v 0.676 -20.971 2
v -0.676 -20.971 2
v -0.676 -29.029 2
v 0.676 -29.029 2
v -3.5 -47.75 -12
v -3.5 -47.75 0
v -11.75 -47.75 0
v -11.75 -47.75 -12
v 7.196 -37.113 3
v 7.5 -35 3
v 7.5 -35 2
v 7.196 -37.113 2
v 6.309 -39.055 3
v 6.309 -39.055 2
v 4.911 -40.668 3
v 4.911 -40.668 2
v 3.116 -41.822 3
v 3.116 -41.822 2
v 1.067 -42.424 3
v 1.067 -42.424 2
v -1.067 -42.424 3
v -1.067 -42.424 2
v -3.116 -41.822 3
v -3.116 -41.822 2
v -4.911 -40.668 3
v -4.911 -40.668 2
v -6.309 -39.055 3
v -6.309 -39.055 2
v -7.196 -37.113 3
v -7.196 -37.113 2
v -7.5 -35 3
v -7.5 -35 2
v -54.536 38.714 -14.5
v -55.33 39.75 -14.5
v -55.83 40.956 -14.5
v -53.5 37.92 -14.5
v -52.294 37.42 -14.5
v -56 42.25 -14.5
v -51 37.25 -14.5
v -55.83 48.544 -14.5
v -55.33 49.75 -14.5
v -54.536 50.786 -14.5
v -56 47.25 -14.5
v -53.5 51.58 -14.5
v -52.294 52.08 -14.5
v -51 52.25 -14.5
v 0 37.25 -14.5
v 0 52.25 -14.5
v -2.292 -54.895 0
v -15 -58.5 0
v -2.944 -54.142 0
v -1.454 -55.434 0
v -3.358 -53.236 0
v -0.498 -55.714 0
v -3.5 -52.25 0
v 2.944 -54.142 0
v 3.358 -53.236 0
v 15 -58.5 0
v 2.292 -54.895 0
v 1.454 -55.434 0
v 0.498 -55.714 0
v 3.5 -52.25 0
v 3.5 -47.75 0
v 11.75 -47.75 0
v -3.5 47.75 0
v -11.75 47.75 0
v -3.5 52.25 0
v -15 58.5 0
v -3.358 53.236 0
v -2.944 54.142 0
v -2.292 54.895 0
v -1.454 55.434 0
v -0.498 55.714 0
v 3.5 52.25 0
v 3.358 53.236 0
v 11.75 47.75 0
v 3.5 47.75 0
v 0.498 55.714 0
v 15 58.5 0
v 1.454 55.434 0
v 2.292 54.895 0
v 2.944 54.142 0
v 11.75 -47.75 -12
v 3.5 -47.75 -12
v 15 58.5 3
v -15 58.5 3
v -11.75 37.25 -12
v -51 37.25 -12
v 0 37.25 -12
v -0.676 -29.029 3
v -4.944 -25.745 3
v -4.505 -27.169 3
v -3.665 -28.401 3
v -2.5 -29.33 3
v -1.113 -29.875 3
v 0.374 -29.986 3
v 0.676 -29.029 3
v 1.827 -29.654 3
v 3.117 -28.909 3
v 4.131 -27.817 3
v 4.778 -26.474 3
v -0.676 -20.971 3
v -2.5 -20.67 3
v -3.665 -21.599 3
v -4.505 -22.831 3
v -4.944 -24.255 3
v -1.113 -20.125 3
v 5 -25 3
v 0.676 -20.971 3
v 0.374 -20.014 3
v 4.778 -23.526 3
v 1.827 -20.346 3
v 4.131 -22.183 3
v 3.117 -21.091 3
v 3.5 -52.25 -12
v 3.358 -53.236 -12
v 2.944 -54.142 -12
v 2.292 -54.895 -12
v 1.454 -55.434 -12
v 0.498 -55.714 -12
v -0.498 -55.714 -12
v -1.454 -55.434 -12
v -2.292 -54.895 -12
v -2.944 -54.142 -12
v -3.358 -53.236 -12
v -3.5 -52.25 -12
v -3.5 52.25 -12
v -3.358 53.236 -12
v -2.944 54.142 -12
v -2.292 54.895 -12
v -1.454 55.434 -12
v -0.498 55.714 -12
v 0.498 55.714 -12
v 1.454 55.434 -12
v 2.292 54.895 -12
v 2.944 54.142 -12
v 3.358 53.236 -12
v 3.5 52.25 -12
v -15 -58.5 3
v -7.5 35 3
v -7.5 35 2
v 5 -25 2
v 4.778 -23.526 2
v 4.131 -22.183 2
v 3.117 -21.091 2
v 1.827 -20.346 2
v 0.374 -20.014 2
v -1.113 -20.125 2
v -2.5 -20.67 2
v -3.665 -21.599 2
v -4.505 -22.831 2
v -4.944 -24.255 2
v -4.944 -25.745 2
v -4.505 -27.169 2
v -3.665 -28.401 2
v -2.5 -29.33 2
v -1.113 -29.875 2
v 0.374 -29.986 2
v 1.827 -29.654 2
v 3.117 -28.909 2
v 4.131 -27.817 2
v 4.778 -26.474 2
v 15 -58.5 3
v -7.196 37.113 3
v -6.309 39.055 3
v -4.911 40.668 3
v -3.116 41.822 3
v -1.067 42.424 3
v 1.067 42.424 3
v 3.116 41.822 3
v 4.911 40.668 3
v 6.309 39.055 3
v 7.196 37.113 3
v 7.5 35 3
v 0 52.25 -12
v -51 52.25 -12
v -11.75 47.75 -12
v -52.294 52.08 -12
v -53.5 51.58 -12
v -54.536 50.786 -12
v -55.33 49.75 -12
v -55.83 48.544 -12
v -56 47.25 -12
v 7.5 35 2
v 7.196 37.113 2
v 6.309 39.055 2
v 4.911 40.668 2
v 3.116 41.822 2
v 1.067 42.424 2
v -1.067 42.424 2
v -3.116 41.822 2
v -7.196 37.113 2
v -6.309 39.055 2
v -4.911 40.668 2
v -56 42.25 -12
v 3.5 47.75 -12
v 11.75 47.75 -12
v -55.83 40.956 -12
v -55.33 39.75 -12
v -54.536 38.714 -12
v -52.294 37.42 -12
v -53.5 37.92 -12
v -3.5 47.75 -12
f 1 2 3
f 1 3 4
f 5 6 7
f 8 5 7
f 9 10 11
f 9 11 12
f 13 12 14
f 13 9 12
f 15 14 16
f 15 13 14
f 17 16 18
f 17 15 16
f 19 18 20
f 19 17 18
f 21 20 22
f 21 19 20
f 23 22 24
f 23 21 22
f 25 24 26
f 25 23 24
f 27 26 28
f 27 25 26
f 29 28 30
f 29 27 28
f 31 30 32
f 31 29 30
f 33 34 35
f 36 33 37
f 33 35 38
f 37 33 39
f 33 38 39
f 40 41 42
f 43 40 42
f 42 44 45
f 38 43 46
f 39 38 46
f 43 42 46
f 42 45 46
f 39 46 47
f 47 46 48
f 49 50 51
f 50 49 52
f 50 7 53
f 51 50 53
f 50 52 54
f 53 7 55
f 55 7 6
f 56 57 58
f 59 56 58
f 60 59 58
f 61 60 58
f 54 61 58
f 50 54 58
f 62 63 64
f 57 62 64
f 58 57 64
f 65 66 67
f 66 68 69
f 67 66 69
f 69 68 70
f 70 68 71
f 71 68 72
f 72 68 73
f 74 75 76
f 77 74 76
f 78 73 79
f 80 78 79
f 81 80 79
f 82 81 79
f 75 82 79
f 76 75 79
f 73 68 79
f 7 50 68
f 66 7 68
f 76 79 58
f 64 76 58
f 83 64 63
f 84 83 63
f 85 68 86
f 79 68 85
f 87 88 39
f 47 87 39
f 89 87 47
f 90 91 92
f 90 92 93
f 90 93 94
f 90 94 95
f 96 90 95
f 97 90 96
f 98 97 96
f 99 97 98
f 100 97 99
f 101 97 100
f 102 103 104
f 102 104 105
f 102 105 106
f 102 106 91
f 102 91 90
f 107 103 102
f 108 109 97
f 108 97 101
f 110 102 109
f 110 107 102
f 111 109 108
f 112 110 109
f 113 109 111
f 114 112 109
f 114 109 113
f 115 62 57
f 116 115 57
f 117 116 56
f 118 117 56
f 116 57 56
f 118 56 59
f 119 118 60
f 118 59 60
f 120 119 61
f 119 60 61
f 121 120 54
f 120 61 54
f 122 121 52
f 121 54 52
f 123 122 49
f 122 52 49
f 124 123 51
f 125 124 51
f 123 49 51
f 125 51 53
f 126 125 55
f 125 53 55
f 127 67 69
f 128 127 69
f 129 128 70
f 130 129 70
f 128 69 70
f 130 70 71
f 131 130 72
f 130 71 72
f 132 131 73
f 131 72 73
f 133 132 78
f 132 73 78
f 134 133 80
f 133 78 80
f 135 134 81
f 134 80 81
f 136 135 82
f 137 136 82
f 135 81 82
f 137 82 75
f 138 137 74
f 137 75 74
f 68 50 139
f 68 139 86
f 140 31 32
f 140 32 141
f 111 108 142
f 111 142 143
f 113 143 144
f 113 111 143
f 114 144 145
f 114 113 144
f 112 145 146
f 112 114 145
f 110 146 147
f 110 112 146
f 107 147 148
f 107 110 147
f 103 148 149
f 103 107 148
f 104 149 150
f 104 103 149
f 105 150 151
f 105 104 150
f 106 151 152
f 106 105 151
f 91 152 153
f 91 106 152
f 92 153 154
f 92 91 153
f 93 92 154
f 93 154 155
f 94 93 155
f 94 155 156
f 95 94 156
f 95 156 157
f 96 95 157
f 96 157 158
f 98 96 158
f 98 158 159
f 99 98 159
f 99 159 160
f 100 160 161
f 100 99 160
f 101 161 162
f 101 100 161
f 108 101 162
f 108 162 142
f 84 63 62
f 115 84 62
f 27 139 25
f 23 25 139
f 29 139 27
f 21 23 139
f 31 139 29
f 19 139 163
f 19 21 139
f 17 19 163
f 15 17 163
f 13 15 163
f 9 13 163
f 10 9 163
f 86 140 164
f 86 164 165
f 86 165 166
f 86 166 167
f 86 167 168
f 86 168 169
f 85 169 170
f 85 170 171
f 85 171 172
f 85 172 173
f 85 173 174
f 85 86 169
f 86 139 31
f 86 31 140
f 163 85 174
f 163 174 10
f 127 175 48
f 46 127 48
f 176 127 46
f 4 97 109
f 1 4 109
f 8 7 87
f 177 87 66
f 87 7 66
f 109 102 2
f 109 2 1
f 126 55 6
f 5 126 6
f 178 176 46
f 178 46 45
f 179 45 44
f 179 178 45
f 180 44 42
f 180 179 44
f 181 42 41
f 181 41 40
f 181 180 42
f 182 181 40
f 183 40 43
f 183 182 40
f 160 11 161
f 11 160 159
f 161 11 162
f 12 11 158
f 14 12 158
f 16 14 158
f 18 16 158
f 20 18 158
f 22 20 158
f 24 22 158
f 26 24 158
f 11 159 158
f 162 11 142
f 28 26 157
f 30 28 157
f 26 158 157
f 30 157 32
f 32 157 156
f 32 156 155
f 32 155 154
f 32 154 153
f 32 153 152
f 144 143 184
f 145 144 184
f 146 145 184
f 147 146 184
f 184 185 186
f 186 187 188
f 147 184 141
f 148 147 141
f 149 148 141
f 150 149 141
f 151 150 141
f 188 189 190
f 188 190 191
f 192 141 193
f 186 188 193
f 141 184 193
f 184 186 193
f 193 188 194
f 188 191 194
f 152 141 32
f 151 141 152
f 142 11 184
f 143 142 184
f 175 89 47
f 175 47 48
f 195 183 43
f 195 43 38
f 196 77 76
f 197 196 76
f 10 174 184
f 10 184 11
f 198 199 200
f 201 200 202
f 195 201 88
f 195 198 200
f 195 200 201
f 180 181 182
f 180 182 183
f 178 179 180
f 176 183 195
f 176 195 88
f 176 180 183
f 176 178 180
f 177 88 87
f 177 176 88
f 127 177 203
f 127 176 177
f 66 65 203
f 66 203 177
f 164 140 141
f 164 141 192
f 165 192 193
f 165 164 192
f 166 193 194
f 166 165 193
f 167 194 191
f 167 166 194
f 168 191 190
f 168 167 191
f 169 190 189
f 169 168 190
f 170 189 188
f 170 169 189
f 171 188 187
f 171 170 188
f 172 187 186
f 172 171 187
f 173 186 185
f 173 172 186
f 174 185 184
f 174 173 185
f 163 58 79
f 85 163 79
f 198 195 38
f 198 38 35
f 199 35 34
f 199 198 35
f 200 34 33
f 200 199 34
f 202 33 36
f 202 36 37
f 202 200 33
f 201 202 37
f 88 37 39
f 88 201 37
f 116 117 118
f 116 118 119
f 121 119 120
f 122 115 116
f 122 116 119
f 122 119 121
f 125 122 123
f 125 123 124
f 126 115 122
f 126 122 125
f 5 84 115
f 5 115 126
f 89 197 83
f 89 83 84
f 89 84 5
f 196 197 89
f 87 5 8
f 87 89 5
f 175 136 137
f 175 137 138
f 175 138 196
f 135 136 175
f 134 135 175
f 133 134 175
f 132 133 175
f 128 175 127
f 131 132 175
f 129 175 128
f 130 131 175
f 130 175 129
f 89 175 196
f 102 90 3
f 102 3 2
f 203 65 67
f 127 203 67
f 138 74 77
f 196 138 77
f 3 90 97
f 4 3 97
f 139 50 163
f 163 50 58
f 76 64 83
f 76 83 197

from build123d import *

# Parameters (mm, degrees)
SKETCH_1_W          = 30
SKETCH_1_H          = 117
EXTRUDE_1_DEPTH     = 3
SKETCH_2_R          = 5
CUT_EXTRUDE_1_DEPTH = 1
SKETCH_3_W          = 1.351446616
SKETCH_3_H          = 8.058414564
CUT_EXTRUDE_2_DEPTH = 1
SKETCH_4_W          = 8.25
SKETCH_4_H          = 95.5
SKETCH_4_W_2        = 7
EXTRUDE_2_DEPTH     = 12
EXTRUDE_3_DEPTH     = 2.5


with BuildPart() as part:
    # 草图1 → 凸台-拉伸1 (new body)
    with BuildSketch(Plane.XY):
        Rectangle(SKETCH_1_W, SKETCH_1_H)
    extrude(amount=EXTRUDE_1_DEPTH)

    # 草图2 → 切除-拉伸1 (cut)
    with BuildSketch(Plane.XY.offset(3)):
        with BuildLine():
            Line((-7.5, -35), (-7.5, 35))
            ThreePointArc((-7.5, 35), (0, 42.5), (7.5, 35))
            Line((7.5, 35), (7.5, -35))
            ThreePointArc((7.5, -35), (0, -42.5), (-7.5, -35))
        make_face()
        with Locations((0, -25)):
            Circle(SKETCH_2_R, mode=Mode.SUBTRACT)
    extrude(amount=-CUT_EXTRUDE_1_DEPTH, mode=Mode.SUBTRACT)

    # 草图3 → 切除-拉伸2 (cut)
    with BuildSketch(Plane.XY.offset(3)):
        with Locations((0, -25)):
            Rectangle(SKETCH_3_W, SKETCH_3_H)
    extrude(amount=-CUT_EXTRUDE_2_DEPTH, mode=Mode.SUBTRACT)

    # 草图4 → 凸台-拉伸2 (add)
    with BuildSketch(Plane(origin=(0, 0, 0), x_dir=(-1, 0, 0), z_dir=(0, 0, -1))):
        with Locations((-7.625, 0)):
            Rectangle(SKETCH_4_W, SKETCH_4_H)
        Rectangle(SKETCH_4_W_2, SKETCH_4_H)
        with BuildLine():
            Line((-3.5, 52.25), (-3.5, 47.75))
            Line((-3.5, 47.75), (3.5, 47.75))
            Line((3.5, 47.75), (3.5, 52.25))
            ThreePointArc((3.5, 52.25), (0, 55.75), (-3.5, 52.25))
        make_face()
        with Locations((7.625, 0)):
            Rectangle(SKETCH_4_W, SKETCH_4_H)
        with BuildLine():
            Line((3.5, -47.75), (-3.5, -47.75))
            Line((-3.5, -47.75), (-3.5, -52.25))
            ThreePointArc((-3.5, -52.25), (0, -55.75), (3.5, -52.25))
            Line((3.5, -52.25), (3.5, -47.75))
        make_face()
    extrude(amount=EXTRUDE_2_DEPTH)

    # 草图5 → 凸台-拉伸3 (add)
    with BuildSketch(Plane(origin=(0, 0, -12), x_dir=(-1, 0, 0), z_dir=(0, 0, -1))):
        with BuildLine():
            Line((0, 52.25), (51, 52.25))
            ThreePointArc((51, 52.25), (54.535533906, 50.785533906), (56, 47.25))
            Line((56, 47.25), (56, 42.25))
            ThreePointArc((56, 42.25), (54.535533906, 38.714466094), (51, 37.25))
            Line((51, 37.25), (0, 37.25))
            Line((0, 37.25), (0, 52.25))
        make_face()
    extrude(amount=EXTRUDE_3_DEPTH)


solid = part.part
